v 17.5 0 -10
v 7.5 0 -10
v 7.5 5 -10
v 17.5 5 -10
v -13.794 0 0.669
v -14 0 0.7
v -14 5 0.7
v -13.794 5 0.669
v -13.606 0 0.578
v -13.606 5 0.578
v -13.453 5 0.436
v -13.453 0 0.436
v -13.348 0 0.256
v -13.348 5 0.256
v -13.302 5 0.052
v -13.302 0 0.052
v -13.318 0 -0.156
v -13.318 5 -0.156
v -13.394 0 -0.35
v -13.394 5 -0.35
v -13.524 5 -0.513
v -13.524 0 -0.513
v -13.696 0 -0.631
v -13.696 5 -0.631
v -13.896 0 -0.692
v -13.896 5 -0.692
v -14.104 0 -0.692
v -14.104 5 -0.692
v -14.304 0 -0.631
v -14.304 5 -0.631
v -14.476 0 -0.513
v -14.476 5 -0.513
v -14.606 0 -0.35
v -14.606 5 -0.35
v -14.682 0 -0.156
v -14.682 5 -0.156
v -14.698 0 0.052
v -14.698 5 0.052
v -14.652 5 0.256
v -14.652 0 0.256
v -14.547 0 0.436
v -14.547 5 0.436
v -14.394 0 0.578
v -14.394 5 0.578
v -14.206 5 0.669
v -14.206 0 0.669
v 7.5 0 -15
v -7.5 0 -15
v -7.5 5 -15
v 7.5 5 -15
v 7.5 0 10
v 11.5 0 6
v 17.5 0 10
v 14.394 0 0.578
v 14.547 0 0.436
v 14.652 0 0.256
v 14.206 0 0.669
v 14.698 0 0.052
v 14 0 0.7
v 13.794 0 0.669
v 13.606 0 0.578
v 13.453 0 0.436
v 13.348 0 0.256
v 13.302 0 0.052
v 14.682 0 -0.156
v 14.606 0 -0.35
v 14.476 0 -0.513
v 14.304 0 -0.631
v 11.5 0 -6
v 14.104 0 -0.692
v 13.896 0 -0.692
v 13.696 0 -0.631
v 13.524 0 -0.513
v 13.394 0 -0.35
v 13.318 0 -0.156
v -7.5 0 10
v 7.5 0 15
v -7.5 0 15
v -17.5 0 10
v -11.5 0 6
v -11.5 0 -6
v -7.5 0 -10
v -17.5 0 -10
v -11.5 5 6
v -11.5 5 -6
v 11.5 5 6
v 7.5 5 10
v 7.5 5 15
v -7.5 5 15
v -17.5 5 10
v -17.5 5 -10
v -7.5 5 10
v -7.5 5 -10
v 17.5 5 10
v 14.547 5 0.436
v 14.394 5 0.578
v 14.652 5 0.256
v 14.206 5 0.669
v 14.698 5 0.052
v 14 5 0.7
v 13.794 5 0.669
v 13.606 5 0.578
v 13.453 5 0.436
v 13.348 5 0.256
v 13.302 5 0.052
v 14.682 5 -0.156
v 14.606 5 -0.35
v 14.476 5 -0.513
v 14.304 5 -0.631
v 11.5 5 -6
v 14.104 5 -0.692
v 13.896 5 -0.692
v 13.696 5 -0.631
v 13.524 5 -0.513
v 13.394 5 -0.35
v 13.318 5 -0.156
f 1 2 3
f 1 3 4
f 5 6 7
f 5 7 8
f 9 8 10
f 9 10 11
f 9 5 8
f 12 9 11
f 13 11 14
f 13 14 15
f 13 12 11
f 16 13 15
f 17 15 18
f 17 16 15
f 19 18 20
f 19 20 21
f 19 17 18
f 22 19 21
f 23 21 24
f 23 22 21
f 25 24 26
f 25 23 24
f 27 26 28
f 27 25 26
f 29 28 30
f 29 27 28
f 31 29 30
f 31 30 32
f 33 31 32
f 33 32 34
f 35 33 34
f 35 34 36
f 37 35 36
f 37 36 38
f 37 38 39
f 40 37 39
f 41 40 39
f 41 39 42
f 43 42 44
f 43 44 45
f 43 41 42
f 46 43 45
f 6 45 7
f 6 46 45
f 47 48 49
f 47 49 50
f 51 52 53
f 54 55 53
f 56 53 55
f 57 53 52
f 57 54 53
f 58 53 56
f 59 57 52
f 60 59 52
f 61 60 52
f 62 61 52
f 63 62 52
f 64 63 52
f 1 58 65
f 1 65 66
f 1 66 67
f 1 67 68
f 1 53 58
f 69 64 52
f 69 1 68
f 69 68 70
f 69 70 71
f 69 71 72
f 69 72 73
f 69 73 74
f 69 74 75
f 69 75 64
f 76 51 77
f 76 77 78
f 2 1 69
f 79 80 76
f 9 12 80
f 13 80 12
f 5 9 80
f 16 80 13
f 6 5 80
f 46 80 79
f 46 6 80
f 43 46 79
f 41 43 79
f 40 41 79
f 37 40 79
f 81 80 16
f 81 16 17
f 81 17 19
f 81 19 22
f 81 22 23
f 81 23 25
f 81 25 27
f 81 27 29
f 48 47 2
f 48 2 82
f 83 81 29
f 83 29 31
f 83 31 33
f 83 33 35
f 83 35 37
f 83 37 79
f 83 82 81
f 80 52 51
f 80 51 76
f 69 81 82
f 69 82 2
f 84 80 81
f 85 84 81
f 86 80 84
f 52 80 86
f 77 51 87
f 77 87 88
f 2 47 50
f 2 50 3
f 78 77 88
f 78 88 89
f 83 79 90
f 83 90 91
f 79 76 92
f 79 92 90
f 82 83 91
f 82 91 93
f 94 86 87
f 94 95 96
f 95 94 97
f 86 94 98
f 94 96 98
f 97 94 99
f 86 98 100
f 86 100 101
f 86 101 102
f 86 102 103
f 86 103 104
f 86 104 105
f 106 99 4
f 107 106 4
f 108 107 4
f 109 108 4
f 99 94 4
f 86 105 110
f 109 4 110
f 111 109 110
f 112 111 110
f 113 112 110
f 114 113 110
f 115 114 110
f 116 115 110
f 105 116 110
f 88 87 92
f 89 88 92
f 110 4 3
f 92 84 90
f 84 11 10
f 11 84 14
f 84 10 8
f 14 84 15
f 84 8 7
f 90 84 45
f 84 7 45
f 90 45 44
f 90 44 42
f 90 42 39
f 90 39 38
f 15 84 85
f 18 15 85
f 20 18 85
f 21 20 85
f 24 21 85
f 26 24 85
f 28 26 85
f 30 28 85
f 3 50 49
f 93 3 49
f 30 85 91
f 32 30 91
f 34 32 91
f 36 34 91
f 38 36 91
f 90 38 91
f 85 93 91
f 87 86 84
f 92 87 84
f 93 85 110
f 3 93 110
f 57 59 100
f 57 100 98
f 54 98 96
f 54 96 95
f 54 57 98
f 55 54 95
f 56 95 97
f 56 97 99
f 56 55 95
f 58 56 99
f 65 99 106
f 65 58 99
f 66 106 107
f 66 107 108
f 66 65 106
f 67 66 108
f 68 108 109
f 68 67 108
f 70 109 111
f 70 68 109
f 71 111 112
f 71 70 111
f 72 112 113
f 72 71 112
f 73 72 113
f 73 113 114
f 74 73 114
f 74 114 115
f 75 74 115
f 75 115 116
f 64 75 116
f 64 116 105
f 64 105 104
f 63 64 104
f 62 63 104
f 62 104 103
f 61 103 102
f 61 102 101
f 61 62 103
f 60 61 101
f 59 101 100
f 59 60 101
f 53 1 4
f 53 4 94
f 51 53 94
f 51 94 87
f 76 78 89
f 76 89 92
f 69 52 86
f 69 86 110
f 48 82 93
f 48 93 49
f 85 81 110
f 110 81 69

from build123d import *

# Parameters (mm, degrees)
SKETCH1_R           = 0.7
SKETCH1_W           = 23
SKETCH1_H           = 12
BOSS_EXTRUDE1_DEPTH = 5


with BuildPart() as part:
    # Sketch1 → Boss-Extrude1 (new body)
    with BuildSketch(Plane(origin=(0, 0, 0), x_dir=(1, 0, 0), z_dir=(0, 1, 0))):
        Polygon((7.5, 10), (17.5, 10), (17.5, -10), (7.5, -10), (7.5, -15), (-7.5, -15), (-7.5, -10), (-17.5, -10), (-17.5, 10), (-7.5, 10), (-7.5, 15), (7.5, 15), align=None)
        with Locations(Location((-14, 0, 0), (0, 0, 270))):
            Circle(SKETCH1_R, mode=Mode.SUBTRACT)
        with Locations(Location((14, 0, 0), (0, 0, 270))):
            Circle(SKETCH1_R, mode=Mode.SUBTRACT)
        Rectangle(SKETCH1_W, SKETCH1_H, mode=Mode.SUBTRACT)
    extrude(amount=BOSS_EXTRUDE1_DEPTH)


solid = part.part
